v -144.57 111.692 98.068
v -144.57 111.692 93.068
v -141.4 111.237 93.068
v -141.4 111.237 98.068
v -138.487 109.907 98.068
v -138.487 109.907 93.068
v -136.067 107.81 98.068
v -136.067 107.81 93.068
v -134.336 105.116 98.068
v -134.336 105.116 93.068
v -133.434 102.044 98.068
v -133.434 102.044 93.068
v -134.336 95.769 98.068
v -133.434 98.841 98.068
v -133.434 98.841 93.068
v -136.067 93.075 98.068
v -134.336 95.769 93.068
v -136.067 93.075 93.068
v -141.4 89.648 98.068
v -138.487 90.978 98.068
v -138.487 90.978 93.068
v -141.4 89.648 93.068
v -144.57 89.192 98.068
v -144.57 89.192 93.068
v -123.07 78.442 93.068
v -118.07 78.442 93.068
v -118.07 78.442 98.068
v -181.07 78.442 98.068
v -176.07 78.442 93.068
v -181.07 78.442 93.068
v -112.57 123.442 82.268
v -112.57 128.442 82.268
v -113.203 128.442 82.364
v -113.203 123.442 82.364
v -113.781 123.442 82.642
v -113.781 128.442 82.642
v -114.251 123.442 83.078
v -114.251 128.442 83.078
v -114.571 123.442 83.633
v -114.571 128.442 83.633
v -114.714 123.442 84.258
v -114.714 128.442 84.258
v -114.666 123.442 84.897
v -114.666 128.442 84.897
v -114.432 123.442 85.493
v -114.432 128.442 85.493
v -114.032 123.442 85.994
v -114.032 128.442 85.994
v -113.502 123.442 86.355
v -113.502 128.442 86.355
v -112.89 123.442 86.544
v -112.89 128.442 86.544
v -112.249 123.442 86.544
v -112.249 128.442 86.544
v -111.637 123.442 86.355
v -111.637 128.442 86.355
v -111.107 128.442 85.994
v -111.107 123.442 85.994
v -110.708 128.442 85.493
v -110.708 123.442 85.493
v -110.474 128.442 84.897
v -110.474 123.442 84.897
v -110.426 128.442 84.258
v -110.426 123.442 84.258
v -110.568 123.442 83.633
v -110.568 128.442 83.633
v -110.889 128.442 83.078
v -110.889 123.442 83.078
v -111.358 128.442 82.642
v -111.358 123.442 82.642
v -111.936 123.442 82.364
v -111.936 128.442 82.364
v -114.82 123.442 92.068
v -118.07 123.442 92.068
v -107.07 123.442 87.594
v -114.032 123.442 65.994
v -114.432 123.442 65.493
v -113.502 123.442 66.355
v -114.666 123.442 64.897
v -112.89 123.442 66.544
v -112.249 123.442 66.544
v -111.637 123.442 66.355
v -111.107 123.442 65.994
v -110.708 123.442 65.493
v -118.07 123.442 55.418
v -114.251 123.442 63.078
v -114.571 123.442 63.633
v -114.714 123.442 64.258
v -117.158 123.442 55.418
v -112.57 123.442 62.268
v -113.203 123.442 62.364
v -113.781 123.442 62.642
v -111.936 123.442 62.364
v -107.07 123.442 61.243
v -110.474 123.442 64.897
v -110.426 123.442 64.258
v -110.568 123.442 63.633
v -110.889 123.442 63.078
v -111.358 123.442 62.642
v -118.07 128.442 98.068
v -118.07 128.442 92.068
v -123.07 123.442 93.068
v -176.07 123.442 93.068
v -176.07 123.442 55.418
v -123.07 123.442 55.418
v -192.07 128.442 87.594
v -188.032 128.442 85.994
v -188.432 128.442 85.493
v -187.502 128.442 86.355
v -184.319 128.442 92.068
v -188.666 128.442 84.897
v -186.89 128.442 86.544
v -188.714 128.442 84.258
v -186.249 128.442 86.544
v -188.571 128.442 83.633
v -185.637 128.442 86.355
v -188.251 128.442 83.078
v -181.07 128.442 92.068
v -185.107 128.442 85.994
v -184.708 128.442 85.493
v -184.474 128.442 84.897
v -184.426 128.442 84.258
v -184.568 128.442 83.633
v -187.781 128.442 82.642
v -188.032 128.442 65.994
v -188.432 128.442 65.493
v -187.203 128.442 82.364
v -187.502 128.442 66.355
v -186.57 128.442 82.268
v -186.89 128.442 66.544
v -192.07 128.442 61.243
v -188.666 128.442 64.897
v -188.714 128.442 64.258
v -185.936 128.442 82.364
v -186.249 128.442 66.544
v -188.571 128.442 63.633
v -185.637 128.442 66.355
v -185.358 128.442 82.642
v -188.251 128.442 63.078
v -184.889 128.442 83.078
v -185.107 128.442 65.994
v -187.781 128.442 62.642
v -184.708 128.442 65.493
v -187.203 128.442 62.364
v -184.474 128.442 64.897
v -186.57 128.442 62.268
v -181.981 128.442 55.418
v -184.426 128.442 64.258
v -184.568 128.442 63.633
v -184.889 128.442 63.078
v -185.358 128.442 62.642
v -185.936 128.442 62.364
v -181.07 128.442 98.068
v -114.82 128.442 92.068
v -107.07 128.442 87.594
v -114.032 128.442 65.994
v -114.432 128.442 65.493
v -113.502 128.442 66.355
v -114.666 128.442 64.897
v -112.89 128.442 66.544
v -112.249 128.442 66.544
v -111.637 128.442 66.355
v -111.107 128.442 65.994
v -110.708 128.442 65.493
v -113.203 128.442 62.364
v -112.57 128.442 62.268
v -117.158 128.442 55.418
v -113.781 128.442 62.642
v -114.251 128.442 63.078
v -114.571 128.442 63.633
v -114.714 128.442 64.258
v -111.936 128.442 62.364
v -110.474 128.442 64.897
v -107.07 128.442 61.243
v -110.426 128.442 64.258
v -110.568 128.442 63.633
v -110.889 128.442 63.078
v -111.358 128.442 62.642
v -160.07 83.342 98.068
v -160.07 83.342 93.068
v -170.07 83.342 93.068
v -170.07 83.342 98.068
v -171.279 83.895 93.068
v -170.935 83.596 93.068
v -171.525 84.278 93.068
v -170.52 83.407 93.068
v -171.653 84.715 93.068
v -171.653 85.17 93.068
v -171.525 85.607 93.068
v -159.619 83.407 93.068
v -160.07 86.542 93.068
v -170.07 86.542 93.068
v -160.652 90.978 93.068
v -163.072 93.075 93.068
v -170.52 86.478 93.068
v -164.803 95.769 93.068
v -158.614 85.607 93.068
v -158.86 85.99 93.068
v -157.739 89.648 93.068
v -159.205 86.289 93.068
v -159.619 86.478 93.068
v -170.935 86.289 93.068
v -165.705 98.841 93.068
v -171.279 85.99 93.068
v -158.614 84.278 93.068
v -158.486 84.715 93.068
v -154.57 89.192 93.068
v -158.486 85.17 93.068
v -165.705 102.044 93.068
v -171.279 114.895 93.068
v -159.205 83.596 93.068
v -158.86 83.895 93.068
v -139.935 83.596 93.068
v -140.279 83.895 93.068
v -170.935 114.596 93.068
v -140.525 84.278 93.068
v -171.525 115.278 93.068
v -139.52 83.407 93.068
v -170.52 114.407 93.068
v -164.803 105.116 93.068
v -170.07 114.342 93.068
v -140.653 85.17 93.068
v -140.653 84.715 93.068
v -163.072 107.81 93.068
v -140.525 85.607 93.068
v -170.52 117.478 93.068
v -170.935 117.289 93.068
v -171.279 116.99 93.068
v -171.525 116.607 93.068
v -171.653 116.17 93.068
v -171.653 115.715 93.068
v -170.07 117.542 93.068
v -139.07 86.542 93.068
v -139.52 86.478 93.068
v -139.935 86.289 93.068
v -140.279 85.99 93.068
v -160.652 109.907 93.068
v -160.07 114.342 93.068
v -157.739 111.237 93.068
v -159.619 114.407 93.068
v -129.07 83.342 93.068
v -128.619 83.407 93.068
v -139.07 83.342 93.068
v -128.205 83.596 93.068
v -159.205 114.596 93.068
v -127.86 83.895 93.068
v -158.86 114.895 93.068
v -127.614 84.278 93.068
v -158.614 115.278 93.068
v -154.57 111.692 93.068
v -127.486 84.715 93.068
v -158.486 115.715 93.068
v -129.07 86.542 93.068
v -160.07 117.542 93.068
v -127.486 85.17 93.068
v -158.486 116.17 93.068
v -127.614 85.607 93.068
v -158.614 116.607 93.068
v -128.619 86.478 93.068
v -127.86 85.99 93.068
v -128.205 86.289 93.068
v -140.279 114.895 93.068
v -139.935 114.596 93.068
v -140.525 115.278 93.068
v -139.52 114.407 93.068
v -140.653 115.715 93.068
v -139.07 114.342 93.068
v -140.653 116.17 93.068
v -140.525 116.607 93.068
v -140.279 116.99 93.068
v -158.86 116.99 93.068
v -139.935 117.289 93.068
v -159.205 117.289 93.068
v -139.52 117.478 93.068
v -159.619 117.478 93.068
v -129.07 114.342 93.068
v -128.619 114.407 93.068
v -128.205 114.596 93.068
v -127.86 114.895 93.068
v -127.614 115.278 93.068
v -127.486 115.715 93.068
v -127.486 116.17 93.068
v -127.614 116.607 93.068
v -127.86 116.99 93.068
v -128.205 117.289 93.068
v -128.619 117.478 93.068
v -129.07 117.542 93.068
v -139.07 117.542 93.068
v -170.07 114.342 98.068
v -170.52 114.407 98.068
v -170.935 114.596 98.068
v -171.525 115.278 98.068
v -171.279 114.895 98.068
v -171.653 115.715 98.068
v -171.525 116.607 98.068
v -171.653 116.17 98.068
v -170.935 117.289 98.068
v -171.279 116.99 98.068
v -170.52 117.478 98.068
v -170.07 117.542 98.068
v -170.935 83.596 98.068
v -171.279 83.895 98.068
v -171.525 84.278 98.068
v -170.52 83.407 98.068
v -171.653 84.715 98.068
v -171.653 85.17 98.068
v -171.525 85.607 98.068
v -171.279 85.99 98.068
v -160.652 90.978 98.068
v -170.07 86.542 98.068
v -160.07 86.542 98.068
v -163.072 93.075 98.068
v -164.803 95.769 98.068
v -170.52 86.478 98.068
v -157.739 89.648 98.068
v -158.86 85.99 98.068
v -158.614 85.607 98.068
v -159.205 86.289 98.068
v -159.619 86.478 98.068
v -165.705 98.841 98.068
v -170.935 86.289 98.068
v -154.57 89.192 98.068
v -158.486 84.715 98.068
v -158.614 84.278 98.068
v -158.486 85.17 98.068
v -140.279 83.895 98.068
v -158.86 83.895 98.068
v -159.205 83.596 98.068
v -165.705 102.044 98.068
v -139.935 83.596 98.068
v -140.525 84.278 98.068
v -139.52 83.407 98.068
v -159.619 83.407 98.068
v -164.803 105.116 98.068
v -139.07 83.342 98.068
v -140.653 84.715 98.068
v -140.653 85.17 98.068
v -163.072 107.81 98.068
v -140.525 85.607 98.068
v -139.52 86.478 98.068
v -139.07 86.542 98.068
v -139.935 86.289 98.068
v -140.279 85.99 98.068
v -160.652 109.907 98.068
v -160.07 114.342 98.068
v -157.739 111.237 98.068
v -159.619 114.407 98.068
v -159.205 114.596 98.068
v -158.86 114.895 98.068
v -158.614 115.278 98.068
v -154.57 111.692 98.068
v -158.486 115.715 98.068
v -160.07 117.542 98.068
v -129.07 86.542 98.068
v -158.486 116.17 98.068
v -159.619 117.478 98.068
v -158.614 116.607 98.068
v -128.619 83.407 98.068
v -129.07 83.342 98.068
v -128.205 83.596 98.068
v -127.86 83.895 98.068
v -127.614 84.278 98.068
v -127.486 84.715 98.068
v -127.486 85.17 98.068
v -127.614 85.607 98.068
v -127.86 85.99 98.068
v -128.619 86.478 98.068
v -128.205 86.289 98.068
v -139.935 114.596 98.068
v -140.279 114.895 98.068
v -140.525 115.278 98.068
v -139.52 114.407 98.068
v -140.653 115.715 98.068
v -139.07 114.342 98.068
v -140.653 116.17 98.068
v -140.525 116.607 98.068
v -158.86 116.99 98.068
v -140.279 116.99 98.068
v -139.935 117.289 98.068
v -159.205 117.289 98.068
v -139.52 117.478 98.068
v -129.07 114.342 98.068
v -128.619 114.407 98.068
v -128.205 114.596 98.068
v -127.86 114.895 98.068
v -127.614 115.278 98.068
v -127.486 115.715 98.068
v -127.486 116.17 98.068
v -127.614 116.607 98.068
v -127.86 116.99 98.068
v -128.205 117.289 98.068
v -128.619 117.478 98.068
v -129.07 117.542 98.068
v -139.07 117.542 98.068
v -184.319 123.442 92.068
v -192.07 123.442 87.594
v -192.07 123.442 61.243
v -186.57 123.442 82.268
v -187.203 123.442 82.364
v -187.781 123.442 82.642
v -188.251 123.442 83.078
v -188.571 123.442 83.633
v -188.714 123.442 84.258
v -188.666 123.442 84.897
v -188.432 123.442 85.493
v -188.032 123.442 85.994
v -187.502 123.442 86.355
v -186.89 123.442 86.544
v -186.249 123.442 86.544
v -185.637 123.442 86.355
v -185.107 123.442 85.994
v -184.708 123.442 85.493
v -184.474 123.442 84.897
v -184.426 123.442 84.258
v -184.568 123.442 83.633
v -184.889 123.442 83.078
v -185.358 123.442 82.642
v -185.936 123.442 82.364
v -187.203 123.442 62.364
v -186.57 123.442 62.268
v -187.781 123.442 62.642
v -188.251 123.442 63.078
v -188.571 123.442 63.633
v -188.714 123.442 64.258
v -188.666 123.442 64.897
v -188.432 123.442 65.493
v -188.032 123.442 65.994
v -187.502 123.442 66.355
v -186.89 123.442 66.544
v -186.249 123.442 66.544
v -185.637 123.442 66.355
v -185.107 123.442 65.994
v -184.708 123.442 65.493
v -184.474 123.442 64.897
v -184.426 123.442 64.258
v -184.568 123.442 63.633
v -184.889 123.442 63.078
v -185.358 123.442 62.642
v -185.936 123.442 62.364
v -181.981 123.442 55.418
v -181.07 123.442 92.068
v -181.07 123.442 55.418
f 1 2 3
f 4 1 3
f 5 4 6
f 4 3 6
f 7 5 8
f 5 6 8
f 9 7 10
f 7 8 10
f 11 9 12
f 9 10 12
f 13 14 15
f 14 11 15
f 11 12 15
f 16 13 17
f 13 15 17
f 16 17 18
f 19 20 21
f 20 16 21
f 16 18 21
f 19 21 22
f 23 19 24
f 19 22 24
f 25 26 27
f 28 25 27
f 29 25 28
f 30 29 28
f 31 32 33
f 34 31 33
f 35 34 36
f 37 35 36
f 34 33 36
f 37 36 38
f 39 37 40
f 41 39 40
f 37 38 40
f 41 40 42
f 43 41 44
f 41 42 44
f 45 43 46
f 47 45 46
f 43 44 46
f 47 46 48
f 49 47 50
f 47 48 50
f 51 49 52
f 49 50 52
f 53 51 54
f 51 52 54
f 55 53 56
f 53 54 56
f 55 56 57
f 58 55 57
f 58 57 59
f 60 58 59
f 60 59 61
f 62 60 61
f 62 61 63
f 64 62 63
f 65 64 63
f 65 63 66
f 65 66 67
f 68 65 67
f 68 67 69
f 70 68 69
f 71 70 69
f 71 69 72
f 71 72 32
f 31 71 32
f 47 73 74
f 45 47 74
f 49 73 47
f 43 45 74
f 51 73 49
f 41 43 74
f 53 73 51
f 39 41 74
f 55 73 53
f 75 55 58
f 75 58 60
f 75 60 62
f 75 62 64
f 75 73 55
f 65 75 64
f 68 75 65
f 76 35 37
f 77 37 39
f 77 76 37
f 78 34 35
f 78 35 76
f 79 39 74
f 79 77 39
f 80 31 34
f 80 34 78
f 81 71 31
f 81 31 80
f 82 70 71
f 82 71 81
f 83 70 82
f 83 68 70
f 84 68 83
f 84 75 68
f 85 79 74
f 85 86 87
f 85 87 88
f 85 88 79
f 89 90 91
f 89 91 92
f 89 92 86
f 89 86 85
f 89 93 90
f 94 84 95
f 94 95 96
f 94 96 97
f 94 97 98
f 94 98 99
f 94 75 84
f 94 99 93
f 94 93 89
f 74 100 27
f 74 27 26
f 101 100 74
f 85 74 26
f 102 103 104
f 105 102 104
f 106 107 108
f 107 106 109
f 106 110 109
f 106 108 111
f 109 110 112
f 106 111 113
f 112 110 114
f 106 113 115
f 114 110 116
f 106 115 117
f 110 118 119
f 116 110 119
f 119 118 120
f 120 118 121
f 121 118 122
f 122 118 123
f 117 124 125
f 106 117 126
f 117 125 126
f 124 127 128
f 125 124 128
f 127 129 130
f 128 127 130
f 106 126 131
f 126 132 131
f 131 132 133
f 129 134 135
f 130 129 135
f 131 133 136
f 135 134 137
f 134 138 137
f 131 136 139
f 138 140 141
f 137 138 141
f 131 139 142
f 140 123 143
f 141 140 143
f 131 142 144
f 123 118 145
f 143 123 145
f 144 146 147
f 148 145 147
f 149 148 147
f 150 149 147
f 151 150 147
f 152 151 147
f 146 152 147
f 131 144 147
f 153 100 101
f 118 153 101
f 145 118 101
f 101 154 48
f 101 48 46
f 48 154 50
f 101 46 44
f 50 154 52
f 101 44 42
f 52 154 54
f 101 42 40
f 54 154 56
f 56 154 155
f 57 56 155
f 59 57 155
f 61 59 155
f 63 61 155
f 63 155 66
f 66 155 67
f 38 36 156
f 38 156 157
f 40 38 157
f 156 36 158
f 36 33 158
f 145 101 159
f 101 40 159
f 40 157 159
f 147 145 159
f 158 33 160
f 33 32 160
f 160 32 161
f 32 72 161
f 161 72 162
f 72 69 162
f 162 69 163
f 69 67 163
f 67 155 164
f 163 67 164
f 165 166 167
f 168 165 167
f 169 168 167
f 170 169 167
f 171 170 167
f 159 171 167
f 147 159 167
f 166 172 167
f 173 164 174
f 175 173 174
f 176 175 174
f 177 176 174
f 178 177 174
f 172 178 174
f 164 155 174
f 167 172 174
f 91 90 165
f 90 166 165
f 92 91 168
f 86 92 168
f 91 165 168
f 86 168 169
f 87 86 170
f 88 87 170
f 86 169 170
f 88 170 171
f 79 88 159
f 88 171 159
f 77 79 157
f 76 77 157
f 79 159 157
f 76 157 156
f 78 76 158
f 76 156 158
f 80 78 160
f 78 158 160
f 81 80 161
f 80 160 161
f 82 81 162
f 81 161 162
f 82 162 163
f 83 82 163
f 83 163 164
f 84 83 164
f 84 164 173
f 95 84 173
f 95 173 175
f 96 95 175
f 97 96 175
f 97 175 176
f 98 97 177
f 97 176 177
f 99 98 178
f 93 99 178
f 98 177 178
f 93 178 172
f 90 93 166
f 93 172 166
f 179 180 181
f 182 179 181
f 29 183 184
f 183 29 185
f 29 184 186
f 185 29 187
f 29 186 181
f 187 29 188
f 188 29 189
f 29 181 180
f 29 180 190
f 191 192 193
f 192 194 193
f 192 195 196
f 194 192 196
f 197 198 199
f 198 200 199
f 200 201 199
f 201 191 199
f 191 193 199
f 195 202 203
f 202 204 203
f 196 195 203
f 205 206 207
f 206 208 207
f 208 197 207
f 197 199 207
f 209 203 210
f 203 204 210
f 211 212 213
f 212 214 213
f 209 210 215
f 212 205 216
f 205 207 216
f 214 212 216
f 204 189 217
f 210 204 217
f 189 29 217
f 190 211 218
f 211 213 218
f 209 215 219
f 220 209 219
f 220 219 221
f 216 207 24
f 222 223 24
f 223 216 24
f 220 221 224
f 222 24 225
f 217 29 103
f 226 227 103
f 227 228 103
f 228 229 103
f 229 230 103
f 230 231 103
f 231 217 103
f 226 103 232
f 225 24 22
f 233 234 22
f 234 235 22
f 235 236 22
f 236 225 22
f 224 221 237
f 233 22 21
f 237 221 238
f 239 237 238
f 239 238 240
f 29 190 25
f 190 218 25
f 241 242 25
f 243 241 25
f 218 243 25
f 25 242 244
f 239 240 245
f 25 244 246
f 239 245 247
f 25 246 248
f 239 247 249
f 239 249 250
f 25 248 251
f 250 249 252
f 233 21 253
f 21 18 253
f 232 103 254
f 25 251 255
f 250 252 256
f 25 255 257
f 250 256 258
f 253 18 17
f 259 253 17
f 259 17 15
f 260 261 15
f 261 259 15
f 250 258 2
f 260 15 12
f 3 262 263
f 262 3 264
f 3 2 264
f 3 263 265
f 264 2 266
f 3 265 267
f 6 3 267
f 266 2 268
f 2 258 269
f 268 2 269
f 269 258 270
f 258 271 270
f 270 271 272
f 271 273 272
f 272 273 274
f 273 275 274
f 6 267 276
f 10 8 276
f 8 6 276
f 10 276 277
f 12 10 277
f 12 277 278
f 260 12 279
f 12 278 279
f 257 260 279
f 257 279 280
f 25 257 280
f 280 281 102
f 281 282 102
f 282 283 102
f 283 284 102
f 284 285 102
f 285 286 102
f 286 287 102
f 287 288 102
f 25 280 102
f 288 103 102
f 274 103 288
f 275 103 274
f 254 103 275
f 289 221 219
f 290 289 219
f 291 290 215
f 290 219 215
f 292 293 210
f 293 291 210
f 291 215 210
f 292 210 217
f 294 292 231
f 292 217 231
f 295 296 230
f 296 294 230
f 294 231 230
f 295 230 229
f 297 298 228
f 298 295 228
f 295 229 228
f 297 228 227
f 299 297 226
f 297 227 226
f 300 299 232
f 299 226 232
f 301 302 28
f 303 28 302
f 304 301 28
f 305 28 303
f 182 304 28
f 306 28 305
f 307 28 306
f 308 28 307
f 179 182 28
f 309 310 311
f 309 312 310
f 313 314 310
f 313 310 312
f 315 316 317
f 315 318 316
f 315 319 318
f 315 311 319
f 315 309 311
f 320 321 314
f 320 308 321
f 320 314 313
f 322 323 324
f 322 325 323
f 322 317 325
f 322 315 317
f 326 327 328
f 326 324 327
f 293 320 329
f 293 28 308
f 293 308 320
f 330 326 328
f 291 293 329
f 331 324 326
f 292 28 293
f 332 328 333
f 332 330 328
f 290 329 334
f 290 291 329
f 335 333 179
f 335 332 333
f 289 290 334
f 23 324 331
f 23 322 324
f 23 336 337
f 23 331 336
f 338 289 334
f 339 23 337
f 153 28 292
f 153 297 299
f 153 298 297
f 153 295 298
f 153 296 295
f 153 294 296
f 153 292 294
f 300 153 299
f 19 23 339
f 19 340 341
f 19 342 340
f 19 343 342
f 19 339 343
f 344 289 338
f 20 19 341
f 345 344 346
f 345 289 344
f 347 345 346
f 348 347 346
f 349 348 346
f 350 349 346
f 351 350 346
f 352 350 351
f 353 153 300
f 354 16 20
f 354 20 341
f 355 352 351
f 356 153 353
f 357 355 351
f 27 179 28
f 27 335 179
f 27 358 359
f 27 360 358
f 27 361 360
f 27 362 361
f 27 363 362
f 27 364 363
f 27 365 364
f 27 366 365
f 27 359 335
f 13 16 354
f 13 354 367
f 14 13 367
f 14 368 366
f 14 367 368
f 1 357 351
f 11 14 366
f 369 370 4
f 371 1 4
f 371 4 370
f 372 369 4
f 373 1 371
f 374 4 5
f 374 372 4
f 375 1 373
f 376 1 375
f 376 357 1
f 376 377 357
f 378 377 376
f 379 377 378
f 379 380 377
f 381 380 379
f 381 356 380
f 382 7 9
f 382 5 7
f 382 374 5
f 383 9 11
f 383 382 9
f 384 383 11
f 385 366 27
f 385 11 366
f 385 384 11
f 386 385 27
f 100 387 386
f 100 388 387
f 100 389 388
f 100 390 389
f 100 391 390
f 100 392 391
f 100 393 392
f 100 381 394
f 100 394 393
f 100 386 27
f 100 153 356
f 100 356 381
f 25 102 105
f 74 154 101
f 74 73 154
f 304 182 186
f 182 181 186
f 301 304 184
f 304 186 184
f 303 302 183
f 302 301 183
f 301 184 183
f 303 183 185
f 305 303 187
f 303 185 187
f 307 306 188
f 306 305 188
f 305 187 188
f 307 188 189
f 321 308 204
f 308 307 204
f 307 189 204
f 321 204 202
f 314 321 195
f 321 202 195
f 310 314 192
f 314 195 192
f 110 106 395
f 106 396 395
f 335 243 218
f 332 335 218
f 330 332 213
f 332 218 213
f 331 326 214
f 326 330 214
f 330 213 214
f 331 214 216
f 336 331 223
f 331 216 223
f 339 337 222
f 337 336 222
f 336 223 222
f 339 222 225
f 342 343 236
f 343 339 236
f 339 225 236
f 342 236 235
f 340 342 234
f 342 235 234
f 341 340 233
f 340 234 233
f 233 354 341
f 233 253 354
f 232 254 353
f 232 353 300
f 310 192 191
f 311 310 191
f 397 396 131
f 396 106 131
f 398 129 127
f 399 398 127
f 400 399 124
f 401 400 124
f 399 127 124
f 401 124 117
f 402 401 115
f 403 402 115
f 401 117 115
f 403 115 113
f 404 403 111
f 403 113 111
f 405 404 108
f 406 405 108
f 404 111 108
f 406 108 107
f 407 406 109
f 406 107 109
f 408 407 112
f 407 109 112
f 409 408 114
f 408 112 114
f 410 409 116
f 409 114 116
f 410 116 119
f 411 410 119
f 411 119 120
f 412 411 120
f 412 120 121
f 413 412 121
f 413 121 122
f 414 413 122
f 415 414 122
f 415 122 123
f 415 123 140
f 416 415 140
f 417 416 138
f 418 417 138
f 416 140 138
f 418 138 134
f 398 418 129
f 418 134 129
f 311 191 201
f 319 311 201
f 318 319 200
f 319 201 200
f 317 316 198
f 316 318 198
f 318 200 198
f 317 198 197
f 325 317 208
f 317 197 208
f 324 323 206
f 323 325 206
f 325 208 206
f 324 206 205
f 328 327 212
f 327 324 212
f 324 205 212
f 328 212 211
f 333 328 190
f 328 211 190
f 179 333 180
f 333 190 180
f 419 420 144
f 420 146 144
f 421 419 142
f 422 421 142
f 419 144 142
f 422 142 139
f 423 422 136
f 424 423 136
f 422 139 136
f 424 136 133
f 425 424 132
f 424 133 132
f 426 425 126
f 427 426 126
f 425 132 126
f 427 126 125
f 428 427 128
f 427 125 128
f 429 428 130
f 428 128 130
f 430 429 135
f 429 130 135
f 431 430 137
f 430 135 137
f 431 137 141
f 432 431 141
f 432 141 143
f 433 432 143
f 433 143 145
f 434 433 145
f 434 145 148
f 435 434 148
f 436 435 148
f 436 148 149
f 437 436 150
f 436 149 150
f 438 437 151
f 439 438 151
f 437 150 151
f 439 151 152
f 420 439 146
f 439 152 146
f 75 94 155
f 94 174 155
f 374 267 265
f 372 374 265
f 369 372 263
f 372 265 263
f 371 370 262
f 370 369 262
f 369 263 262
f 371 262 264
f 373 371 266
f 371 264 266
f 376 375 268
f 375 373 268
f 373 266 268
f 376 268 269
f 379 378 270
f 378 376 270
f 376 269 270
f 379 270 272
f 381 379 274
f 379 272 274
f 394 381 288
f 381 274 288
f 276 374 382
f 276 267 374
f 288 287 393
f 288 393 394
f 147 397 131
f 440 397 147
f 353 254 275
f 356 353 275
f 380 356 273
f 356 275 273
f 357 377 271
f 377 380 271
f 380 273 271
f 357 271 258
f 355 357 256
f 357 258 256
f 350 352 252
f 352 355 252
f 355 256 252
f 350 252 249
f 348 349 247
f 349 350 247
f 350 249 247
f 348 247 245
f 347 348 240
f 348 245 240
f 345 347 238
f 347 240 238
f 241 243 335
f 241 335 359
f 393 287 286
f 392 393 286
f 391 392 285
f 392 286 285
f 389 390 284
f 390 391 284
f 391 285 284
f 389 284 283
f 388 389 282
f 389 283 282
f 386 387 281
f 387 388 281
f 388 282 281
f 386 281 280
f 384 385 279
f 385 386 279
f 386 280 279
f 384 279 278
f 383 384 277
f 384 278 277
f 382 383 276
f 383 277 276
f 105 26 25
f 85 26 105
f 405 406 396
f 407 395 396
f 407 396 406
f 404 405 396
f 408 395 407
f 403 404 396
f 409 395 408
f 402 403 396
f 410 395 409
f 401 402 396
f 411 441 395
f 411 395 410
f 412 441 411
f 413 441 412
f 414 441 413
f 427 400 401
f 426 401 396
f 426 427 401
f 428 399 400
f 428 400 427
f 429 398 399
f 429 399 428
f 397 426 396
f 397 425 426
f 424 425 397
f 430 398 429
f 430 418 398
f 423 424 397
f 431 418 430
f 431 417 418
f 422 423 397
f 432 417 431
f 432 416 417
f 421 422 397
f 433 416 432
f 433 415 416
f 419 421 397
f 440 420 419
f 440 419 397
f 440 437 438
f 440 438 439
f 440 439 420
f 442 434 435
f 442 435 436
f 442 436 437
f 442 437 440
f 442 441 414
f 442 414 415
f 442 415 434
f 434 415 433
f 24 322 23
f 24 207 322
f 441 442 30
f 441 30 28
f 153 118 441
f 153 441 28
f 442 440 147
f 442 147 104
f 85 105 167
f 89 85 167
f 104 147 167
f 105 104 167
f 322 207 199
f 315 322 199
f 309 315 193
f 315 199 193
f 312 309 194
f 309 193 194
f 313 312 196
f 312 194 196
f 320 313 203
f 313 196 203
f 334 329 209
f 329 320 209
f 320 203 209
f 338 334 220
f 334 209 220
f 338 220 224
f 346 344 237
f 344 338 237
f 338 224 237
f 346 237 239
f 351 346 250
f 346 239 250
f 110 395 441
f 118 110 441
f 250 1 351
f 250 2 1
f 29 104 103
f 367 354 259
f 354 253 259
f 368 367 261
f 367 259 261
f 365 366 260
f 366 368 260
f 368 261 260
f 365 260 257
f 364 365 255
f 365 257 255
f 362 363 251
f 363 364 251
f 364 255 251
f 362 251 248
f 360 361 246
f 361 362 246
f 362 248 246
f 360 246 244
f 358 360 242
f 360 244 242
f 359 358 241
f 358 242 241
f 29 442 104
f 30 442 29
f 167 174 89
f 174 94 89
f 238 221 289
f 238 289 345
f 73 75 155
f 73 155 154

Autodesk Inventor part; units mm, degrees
ref_plane "XZ Plane" through (0, 0, 0) normal (0, 1, 0) x (-1, 0, 0)
ref_plane "XY Plane" through (0, 0, 0) normal (0, 0, 1) x (1, 0, 0)
ref_plane "Work Plane1" through (-118.9196, 128.4425, 80.2184) normal (0, -1, 0) x (0, 0, -1)
sketch "Sketch1" plane through (-118.9196, 128.4425, 80.2184) normal (0, -1, 0) x (0, 0, -1)
  line L0 (-4.2, -124) -> (-4.2, 744) construction
  line L1 (15.8, -124) -> (15.8, 744) construction
  line L2 (25.8, 100) -> (25.8, 520) construction
  line L3 (-12.85, -73.15) -> (24.8, -73.15)
  line L4 (24.8, -73.15) -> (24.8, 11.85)
  line L5 (24.8, 11.85) -> (-12.85, 11.85)
  line L6 (-12.85, 11.85) -> (-12.85, -73.15)
  line L7 (25.8, -30.65) -> (5.6685, -30.65) construction
  circle A0 centre (15.8, -67.65) radius 5.5 construction
  circle A1 centre (15.8, 6.35) radius 5.5 construction
  line L8 (5.8, -58.8473) -> (5.8, 42.3952) construction
  circle A2 centre (-4.2, -67.65) radius 5.5 construction
  circle A3 centre (-4.2, 6.35) radius 5.5 construction
  point P0 (80.2184, 118.9196)
  point P1 (18.9754, -73.15)
  point P2 (24.8, -26.5615)
  dimension "d0" = 1
  dimension "d1" = 38.65
  dimension "d3" = 11
  dimension "d4" = 63
  dimension "d7" = 0
  dimension "d9" = 10
  dimension "d10" = 10
extrude "Extrusion1" add sketch "Sketch1" along normal blind 5
ref_plane "Work Plane2" through (-149.5696, 123.4425, 93.0684) normal (1, 0, 0) x (0, 1, 0)
sketch "Sketch4" plane through (-192.0696, 128.4425, 93.0684) normal (0, 0, 1) x (1, 0, 0)
  line L0 (85, 0) -> (0, 0) construction
  line L1 (0, 0) -> (0, -5) construction
  line L2 (85, -5) -> (0, -5) construction
  line L3 (85, 0) -> (85, -5) construction
  line L4 (0, 0) -> (85, 0) construction
  line L5 (42.5, 0) -> (42.5, -58.6666) construction
  line L6 (11, 0) -> (74, 0)
  line L7 (74, 0) -> (74, -50)
  line L8 (74, -50) -> (11, -50)
  line L9 (11, -50) -> (11, 0)
  line L10 (27, -43.5) -> (58, -43.5) construction
  line L11 (58, -43.5) -> (58, -12.5) construction
  line L12 (58, -12.5) -> (27, -12.5) construction
  line L13 (27, -12.5) -> (27, -43.5) construction
  line L14 (27, -43.5) -> (58, -12.5) construction
  line L15 (58, -43.5) -> (27, -12.5) construction
  line L16 (32, -12.5) -> (22, -12.5) construction
  line L17 (32, -10.9) -> (22, -10.9)
  line L18 (22, -14.1) -> (32, -14.1)
  arc A0 (32, -14.1) -> (32, -10.9) centre (32, -12.5) ccw
  arc A1 (22, -10.9) -> (22, -14.1) centre (22, -12.5) ccw
  line L19 (53, -12.5) -> (63, -12.5) construction
  line L20 (53, -14.1) -> (63, -14.1)
  line L21 (63, -10.9) -> (53, -10.9)
  arc A2 (53, -10.9) -> (53, -14.1) centre (53, -12.5) ccw
  arc A3 (63, -14.1) -> (63, -10.9) centre (63, -12.5) ccw
  line L22 (32, -43.5) -> (22, -43.5) construction
  line L23 (32, -45.1) -> (22, -45.1)
  line L24 (22, -41.9) -> (32, -41.9)
  arc A4 (32, -45.1) -> (32, -41.9) centre (32, -43.5) ccw
  arc A5 (22, -41.9) -> (22, -45.1) centre (22, -43.5) ccw
  line L25 (53, -43.5) -> (63, -43.5) construction
  line L26 (53, -45.1) -> (63, -45.1)
  line L27 (63, -41.9) -> (53, -41.9)
  arc A6 (53, -41.9) -> (53, -45.1) centre (53, -43.5) ccw
  arc A7 (63, -45.1) -> (63, -41.9) centre (63, -43.5) ccw
  line L28 (37.5, -28) -> (47.5, -28) construction
  line L29 (37.5, -39.25) -> (47.5, -39.25)
  line L30 (47.5, -16.75) -> (37.5, -16.75)
  arc A8 (37.5, -16.75) -> (37.5, -39.25) centre (37.5, -28) ccw
  arc A9 (47.5, -39.25) -> (47.5, -16.75) centre (47.5, -28) ccw
  point P0 (192.0696, -128.4425)
  point P1 (42.5, -28)
  dimension "d14" = 63
  dimension "d15" = 45
  dimension "d16" = 31
  dimension "d17" = 31
  dimension "d18" = 3.2
  dimension "d19" = 10
  dimension "d21" = 10
  dimension "d22" = 1.6
  dimension "d23" = 10
  dimension "d24" = 10
  dimension "d25" = 1.6
  dimension "d26" = 1.6
  dimension "d27" = 22.5
  dimension "d28" = 10
extrude "Extrusion2" add sketch "Sketch4" along normal blind 5
sketch "Sketch5" plane through (-181.0696, 78.4425, 93.0684) normal (-1, 0, 0) x (0, 0, 1)
  line L0 (0, 45) -> (0, 0) projected
  line L1 (0, 45) -> (-37.65, 45) projected
  line L2 (-37.65, 50) -> (-37.65, 45) projected
  line L3 (0, 0) -> (0, 45) projected
  line L4 (-37.65, 45) -> (0, 0)
  point P0 (-93.0684, -78.4425)
extrude "Extrusion3" add sketch "Sketch5" against normal blind 5
sketch "Sketch6" plane through (-118.0696, 78.4425, 93.0684) normal (1, 0, 0) x (0, 0, -1)
  line L0 (0, 0) -> (37.65, 45) projected
  line L1 (0, 45) -> (37.65, 45) projected
  line L2 (0, 0) -> (0, 45) projected
  point P0 (93.0684, -78.4425)
extrude "Extrusion4" add sketch "Sketch6" against normal blind 5
sketch "Sketch7" plane through (-118.9196, 123.4425, 80.2184) normal (0, -1, 0) x (1, 0, 0)
  circle A0 centre (-67.65, -15.8) radius 5.5 construction
  circle A1 centre (-67.65, 4.2) radius 5.5 construction
  circle A2 centre (6.35, 4.2) radius 5.5 construction
  circle A3 centre (6.35, -15.8) radius 5.5 construction
  point P0 (118.9196, -80.2184)
hole "Hole1" at (-186.5696, 123.4425, 84.4184) at (-186.5696, 123.4425, 64.4184) at (-112.5696, 123.4425, 64.4184) at (-112.5696, 123.4425, 84.4184) direction (0, 1, 0) diameter 4.3 end through all clearance for "Hex Head Cap Screw DIN EN 24017" size "M4" standard "DIN"
sketch "Sketch8" plane through (-118.9196, 123.4425, 80.2184) normal (0, -1, 0) x (1, 0, 0)
  circle A0 centre (-67.65, 4.2) radius 2.15 projected
  circle A1 centre (-67.65, -15.8) radius 2.15 projected
  line L0 (-62.15, -24.8) -> (-62.15, 12.85) projected
  line L1 (-62.15, 12.85) -> (-73.15, 12.85) projected
  line L2 (-73.15, 12.85) -> (-73.15, -24.8) projected
  line L3 (-73.15, -24.8) -> (-62.15, -24.8) projected
  circle A2 centre (6.35, -15.8) radius 2.15 projected
  circle A3 centre (6.35, 4.2) radius 2.15 projected
  line L4 (0.85, 12.85) -> (0.85, -24.8) projected
  line L5 (0.85, -24.8) -> (11.85, -24.8) projected
  line L6 (11.85, -24.8) -> (11.85, 12.85) projected
  line L7 (11.85, 12.85) -> (0.85, 12.85) projected
  line L8 (-73.15, 7.3754) -> (-65.3998, 11.85)
  line L9 (-73.15, -18.9754) -> (-62.15, -25.3263)
  line L10 (11.85, 7.3754) -> (4.0998, 11.85)
  line L11 (11.85, -18.9754) -> (0.85, -25.3263)
  line L12 (-65.3998, 11.85) -> (-62.15, 11.85)
  line L13 (4.0998, 11.85) -> (0.85, 11.85)
  point P0 (118.9196, -80.2184)
  point P1 (37.3678, 12.85)
  point P2 (-28.6678, 12.85)
  point P3 (1.7615, -24.8)
  point P4 (-63.0615, -24.8)
  point P5 (37.3678, 12.85)
  dimension "d42" = 60
  dimension "d43" = 5.5
  dimension "d44" = 60
  dimension "d45" = 5.5
  dimension "d46" = 60
  dimension "d47" = 5.5
  dimension "d48" = 60
  dimension "d49" = 5.5
  dimension "d53" = 7.65
  dimension "d54" = 7.65
extrude "Extrusion5" cut sketch "Sketch8" against normal blind 5 contours L12 L8 L2 L1 L0 | L3 L2 L9 | L7 L6 L10 L13 L4 | L11 L6 L5
equation "\"d1\" = MOTOR_HEIGHT"
equation "\"d9\" = d10"
equation "\"d19\" = SLOT_PLAY"
equation "\"d21\" = d19"
equation "\"d22\" = 0.5 * d18"
equation "\"d23\" = d19"
equation "\"d24\" = d19"
equation "\"d25\" = d22"
equation "\"d26\" = d22"
equation "\"d28\" = SLOT_PLAY"
equation "\"d44\" = d42"
equation "\"d45\" = d43"
equation "\"d47\" = d43"
equation "\"d49\" = d45"
equation "\"d54\" = d53"
equation "\"MOTOR_HEIGHT\" = 38.65"
equation "\"SLOT_PLAY\" = 10"
properties part number "MotorBracketV2"
